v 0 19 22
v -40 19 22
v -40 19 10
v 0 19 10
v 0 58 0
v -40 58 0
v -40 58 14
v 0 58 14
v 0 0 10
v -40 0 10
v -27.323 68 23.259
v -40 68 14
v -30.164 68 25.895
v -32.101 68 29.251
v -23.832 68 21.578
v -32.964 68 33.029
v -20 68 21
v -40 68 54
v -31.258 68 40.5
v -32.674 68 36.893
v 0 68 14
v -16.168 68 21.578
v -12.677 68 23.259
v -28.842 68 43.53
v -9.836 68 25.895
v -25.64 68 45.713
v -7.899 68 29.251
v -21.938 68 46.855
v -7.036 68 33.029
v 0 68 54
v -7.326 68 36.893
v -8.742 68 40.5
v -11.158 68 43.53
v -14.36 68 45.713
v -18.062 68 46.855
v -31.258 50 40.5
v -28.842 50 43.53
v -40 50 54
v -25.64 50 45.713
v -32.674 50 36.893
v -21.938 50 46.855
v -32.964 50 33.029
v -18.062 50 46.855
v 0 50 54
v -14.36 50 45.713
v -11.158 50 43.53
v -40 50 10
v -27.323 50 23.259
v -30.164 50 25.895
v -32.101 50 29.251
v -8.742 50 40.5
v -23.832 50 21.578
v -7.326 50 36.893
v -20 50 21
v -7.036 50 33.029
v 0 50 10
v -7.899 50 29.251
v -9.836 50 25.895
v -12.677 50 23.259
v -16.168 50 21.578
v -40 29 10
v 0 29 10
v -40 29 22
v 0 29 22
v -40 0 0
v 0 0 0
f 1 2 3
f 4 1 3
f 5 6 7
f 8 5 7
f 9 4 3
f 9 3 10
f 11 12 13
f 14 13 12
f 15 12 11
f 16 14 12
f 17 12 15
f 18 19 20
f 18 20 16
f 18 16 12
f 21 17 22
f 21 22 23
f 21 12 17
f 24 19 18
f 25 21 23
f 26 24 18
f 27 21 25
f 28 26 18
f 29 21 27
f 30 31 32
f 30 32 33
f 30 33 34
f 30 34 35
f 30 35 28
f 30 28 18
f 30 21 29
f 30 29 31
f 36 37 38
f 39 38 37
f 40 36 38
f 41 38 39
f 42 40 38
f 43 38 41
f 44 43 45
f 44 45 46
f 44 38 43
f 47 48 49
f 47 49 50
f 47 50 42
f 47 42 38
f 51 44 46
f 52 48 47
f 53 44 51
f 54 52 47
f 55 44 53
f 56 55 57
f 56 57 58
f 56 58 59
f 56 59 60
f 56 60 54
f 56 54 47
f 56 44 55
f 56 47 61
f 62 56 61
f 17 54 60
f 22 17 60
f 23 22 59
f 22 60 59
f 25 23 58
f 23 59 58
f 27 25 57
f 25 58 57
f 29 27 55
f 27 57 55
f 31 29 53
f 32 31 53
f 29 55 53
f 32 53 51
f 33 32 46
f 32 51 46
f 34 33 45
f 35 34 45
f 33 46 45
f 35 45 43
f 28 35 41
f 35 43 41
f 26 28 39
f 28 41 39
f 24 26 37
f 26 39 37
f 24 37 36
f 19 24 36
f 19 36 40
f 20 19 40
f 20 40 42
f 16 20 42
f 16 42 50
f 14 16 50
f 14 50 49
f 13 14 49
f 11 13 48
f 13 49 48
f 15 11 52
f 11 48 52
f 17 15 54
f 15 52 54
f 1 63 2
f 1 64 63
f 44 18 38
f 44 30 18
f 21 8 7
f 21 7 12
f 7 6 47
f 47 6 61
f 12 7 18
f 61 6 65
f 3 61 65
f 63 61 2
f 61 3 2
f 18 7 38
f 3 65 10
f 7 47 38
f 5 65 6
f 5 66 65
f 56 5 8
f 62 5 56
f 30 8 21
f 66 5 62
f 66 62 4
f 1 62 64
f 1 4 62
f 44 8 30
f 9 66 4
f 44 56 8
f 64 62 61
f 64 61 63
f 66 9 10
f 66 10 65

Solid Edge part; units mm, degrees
sketch "Sketch1" plane through (0, 0, 0) normal (1, 0, 0) x (0, 1, 0)
  line L0 (19, 22) -> (19, 10)
  line L1 (19, 10) -> (0, 10)
  line L2 (0, 10) -> (0, 0)
  line L3 (0, 0) -> (58, 0)
  line L4 (58, 0) -> (58, 14)
  line L5 (58, 14) -> (68, 14)
  line L6 (68, 14) -> (68, 54)
  line L7 (68, 54) -> (50, 54)
  line L8 (50, 54) -> (50, 10)
  line L9 (50, 10) -> (29, 10)
  line L10 (29, 10) -> (29, 22)
  line L11 (29, 22) -> (19, 22)
extrude "ProtrusiónExtruida_1" add sketch "Sketch1" against normal blind 40
hole "Agujero_1" at (-20, 50, 34) direction (0, 1, 0) diameter 26 end up to next
